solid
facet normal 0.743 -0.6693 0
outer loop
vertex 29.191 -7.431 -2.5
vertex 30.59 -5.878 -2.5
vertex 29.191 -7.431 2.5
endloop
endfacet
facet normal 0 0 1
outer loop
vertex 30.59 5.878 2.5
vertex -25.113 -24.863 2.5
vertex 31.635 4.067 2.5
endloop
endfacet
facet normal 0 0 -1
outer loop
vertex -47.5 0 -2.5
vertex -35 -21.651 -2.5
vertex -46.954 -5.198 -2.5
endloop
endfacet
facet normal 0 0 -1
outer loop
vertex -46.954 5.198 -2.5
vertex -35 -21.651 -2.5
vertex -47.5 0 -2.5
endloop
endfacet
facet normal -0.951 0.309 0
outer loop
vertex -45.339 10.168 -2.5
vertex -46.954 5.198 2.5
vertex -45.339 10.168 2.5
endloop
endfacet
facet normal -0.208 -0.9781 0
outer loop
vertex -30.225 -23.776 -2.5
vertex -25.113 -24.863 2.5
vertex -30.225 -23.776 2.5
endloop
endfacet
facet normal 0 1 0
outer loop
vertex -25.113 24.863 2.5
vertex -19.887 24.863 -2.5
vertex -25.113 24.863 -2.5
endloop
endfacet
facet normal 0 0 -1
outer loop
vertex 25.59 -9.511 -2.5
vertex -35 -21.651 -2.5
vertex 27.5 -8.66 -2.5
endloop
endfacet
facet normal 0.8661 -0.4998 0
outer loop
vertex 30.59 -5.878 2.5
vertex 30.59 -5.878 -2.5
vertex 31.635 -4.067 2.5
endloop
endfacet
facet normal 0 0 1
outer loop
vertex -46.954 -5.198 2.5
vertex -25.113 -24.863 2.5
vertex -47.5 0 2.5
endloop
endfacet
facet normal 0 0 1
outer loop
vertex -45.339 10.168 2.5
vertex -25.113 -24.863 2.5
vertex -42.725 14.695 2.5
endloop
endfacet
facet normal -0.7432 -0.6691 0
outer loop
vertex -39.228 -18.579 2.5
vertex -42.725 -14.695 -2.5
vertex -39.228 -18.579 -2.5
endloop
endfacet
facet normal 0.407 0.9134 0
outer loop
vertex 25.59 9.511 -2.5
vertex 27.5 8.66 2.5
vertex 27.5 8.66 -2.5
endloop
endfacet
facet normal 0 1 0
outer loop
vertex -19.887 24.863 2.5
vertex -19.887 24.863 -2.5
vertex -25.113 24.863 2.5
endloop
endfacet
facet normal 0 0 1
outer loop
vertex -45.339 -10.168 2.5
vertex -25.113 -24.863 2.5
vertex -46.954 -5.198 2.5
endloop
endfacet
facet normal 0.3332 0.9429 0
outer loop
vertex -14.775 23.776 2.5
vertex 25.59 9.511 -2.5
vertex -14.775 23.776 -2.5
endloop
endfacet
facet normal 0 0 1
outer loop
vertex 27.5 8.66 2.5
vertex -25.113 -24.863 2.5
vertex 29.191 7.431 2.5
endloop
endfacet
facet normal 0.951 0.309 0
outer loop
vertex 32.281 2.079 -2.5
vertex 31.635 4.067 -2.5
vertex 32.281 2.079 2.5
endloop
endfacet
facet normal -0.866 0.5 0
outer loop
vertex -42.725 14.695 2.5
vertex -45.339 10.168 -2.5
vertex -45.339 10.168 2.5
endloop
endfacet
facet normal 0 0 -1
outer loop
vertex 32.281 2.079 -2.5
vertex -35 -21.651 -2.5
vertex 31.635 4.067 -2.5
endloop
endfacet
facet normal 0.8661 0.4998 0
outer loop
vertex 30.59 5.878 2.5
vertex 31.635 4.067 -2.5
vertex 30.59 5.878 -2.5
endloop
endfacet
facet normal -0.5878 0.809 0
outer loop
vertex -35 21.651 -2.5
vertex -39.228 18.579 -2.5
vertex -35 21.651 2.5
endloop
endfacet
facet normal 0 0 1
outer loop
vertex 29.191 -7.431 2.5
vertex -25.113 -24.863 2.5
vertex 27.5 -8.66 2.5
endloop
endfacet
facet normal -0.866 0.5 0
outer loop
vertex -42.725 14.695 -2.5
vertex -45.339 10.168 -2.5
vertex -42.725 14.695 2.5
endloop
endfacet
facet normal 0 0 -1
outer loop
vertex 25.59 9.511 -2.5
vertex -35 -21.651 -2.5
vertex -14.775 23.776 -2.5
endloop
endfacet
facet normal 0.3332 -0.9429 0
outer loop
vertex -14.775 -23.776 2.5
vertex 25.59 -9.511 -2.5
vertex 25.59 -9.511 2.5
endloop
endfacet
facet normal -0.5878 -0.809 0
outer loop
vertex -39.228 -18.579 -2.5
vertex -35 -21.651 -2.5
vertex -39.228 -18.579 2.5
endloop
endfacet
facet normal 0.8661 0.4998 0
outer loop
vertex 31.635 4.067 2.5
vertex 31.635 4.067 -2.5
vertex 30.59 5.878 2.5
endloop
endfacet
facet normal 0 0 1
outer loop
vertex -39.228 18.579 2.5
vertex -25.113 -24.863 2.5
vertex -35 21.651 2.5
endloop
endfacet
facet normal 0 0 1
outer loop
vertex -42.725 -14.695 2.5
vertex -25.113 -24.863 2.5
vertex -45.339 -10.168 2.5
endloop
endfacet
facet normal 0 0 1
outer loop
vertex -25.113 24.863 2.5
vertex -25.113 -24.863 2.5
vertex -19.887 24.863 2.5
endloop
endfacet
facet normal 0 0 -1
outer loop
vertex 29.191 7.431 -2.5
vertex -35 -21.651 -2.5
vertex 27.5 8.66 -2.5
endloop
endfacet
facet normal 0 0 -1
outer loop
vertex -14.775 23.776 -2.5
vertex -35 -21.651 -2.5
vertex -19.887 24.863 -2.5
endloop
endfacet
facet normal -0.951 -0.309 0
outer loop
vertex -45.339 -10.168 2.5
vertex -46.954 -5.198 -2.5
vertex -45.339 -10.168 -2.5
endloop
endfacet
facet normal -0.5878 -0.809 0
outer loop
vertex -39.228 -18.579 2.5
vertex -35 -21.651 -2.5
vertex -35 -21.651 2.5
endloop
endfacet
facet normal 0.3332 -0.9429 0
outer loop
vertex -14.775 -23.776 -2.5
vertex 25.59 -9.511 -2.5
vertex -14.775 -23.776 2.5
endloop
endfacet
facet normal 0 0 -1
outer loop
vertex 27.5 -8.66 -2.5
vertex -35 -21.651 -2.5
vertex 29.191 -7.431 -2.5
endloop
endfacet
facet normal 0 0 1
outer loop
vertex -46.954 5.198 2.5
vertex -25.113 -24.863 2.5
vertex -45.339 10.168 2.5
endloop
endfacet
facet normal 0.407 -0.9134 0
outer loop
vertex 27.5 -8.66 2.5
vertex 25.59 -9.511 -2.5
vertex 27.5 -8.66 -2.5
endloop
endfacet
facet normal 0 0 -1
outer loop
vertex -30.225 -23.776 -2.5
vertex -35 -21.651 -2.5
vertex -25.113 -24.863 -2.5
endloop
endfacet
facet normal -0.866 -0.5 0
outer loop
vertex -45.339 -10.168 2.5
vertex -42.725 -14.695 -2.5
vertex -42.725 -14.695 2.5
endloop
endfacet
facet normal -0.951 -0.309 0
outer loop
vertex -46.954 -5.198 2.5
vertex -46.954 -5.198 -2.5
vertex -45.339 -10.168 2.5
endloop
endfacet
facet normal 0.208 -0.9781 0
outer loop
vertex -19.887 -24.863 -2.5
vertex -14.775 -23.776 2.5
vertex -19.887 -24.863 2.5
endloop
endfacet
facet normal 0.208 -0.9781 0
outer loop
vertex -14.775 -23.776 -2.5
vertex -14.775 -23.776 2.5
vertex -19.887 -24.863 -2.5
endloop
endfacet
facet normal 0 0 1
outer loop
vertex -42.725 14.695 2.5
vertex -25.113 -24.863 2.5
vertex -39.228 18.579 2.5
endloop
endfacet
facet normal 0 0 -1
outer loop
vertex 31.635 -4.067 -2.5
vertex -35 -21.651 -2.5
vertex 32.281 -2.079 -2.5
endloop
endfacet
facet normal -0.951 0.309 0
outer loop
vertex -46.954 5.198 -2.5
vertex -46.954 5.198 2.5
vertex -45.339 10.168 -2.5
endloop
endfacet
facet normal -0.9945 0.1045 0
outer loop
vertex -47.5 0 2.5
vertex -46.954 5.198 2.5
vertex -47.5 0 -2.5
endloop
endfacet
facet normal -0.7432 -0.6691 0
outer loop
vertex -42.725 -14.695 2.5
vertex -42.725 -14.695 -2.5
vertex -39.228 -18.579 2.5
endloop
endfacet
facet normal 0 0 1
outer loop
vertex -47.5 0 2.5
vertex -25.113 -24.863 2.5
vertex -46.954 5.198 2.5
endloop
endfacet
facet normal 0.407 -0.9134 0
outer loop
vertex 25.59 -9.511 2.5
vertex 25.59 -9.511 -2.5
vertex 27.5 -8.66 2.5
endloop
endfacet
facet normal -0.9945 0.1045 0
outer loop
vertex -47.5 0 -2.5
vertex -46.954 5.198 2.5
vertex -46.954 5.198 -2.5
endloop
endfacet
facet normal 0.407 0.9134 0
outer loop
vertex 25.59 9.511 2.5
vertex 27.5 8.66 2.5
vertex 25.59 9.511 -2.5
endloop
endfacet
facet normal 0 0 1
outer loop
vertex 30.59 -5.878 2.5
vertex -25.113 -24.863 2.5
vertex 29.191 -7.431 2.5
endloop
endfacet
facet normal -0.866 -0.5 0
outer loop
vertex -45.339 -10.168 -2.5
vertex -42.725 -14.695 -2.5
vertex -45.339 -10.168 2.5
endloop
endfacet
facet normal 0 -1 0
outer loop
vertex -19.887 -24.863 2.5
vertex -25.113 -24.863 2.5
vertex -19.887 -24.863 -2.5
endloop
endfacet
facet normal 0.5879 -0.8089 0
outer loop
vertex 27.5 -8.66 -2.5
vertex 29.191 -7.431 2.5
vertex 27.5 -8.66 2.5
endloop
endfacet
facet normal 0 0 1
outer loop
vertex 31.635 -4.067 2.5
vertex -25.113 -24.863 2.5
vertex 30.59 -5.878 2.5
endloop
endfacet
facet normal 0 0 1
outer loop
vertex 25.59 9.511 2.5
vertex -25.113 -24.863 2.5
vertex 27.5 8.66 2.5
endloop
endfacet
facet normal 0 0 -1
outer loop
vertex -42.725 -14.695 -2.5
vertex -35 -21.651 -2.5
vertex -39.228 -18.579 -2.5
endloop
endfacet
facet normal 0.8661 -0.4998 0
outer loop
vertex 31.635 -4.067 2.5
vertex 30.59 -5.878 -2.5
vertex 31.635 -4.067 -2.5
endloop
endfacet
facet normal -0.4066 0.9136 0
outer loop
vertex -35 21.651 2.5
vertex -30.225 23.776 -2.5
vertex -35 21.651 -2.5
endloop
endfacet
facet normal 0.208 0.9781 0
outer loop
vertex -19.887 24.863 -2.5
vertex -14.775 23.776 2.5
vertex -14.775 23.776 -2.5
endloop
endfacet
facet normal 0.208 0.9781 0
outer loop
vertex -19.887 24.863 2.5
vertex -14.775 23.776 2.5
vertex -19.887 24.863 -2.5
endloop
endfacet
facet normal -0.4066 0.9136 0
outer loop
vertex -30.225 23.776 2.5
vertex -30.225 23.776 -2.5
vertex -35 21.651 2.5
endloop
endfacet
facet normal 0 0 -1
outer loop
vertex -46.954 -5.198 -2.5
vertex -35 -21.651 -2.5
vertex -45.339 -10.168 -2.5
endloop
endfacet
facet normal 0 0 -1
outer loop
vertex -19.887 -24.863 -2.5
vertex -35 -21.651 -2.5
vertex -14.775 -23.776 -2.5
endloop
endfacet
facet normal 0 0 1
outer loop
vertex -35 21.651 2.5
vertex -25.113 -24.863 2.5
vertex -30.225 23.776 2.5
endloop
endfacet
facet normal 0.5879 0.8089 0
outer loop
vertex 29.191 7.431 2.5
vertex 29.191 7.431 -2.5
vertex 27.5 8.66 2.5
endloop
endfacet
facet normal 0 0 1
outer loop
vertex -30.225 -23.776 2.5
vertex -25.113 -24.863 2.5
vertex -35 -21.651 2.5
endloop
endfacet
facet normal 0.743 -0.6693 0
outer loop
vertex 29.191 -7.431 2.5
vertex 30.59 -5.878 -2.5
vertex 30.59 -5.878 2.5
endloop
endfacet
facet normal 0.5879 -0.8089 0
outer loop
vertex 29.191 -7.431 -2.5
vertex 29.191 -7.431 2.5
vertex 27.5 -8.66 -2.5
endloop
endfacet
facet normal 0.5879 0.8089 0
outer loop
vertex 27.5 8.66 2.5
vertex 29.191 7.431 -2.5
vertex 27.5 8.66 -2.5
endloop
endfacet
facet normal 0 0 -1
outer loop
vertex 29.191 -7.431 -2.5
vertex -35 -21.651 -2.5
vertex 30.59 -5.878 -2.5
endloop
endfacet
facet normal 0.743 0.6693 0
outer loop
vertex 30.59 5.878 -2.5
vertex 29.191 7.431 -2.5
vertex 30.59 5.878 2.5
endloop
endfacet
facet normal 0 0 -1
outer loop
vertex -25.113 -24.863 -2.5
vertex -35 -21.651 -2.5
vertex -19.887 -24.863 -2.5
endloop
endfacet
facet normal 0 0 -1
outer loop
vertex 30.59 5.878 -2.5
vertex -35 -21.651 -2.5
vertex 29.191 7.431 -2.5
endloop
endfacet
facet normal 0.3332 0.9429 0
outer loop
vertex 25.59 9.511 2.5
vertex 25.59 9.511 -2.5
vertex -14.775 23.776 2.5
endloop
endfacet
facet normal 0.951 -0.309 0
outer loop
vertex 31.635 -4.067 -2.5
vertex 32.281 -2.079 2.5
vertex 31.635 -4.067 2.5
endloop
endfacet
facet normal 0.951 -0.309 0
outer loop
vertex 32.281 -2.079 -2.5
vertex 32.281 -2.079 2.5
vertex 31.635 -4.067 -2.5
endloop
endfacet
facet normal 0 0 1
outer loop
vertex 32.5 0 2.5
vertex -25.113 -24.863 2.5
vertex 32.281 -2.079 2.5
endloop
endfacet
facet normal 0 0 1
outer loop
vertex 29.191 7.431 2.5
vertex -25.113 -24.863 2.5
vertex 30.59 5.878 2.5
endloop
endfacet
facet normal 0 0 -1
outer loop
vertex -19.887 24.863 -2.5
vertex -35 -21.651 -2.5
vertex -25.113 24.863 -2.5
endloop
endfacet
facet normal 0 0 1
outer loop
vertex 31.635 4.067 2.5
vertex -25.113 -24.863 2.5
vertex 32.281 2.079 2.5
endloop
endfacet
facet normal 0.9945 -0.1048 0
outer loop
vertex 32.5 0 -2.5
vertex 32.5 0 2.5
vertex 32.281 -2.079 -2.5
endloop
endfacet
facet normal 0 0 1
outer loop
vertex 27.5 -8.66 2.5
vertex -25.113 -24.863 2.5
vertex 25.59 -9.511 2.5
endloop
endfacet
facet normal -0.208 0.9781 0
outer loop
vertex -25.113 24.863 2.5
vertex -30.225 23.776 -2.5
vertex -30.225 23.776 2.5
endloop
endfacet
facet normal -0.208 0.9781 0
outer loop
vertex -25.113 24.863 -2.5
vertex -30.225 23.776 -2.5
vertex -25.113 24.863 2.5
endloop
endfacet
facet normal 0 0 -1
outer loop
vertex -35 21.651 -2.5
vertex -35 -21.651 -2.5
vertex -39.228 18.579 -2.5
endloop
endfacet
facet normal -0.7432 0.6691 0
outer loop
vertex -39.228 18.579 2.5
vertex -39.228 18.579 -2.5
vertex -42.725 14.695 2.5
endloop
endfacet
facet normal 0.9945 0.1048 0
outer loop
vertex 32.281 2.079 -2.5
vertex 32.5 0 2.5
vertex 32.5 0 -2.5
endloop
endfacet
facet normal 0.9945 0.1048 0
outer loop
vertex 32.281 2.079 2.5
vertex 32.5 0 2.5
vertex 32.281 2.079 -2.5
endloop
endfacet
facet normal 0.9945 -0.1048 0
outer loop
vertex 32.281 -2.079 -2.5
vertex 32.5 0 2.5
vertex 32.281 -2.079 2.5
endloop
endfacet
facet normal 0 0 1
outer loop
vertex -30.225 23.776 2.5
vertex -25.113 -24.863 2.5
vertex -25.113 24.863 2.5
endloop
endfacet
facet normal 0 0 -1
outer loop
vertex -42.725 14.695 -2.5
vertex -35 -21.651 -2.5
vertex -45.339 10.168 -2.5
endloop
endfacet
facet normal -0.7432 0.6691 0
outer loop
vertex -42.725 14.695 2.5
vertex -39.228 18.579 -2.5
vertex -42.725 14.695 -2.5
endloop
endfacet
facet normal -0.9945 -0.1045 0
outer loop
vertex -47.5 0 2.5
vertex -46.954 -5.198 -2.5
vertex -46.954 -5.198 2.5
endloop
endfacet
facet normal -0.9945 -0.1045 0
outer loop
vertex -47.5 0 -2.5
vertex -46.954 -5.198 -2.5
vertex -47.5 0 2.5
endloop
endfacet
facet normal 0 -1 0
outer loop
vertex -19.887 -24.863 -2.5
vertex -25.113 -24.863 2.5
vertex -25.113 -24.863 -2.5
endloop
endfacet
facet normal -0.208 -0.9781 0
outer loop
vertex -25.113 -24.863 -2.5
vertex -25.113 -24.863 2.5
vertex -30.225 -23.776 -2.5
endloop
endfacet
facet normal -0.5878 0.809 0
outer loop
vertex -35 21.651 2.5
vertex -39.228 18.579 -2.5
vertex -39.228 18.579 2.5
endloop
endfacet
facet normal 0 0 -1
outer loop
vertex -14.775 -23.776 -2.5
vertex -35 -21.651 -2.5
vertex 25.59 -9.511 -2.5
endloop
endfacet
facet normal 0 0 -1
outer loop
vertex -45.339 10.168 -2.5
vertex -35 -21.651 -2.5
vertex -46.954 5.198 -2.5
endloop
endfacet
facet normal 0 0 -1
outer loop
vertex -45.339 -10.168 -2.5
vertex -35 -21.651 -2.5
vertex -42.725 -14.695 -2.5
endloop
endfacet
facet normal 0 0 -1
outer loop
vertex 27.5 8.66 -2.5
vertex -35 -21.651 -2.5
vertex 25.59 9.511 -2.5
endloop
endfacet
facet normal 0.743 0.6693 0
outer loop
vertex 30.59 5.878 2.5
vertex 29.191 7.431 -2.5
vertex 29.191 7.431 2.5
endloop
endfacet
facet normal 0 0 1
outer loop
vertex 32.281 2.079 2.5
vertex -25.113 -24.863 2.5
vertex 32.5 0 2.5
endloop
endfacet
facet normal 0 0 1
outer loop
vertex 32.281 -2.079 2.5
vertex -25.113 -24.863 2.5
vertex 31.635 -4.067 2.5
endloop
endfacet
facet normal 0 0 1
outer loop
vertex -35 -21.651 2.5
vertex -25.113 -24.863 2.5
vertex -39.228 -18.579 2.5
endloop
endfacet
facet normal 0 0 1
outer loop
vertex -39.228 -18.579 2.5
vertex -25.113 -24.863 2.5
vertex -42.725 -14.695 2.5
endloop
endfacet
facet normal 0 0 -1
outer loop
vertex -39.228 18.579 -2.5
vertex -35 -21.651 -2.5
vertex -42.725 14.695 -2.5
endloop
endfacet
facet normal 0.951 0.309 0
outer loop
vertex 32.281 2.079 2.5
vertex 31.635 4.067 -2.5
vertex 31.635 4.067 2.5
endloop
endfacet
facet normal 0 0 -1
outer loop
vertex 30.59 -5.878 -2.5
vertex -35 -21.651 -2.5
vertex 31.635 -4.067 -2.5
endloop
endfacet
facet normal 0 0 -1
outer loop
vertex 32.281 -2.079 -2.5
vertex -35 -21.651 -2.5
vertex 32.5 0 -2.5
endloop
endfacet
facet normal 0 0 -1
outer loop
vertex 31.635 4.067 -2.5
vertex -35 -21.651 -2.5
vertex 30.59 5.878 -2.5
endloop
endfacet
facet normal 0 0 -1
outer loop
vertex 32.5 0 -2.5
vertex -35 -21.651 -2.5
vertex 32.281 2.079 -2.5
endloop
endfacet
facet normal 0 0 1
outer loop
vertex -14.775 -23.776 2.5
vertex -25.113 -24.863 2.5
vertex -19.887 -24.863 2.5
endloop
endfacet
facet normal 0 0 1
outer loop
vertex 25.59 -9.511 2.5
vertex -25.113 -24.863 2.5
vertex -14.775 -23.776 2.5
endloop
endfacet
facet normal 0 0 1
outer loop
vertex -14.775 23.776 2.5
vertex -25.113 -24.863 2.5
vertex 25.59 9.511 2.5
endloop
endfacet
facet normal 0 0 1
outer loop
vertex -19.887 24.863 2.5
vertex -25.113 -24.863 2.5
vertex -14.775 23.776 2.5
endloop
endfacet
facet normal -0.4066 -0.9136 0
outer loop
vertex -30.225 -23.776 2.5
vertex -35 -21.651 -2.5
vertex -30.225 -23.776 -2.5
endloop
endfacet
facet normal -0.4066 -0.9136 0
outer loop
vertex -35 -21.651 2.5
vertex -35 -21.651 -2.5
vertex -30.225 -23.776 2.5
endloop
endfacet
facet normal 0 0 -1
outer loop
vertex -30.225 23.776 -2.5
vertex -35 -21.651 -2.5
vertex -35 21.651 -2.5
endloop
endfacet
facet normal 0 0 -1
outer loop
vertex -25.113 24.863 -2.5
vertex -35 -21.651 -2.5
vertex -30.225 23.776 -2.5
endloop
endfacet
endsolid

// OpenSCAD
r1= 25;
r2= 10;
th= 5;
d= r1+r2+10;

hull(){
    translate([-d/2,0,0])
        cylinder(r=r1, h=th, center=true);

    translate([d/2,0,0])
        cylinder(r=r2, h=th, center=true);
}
